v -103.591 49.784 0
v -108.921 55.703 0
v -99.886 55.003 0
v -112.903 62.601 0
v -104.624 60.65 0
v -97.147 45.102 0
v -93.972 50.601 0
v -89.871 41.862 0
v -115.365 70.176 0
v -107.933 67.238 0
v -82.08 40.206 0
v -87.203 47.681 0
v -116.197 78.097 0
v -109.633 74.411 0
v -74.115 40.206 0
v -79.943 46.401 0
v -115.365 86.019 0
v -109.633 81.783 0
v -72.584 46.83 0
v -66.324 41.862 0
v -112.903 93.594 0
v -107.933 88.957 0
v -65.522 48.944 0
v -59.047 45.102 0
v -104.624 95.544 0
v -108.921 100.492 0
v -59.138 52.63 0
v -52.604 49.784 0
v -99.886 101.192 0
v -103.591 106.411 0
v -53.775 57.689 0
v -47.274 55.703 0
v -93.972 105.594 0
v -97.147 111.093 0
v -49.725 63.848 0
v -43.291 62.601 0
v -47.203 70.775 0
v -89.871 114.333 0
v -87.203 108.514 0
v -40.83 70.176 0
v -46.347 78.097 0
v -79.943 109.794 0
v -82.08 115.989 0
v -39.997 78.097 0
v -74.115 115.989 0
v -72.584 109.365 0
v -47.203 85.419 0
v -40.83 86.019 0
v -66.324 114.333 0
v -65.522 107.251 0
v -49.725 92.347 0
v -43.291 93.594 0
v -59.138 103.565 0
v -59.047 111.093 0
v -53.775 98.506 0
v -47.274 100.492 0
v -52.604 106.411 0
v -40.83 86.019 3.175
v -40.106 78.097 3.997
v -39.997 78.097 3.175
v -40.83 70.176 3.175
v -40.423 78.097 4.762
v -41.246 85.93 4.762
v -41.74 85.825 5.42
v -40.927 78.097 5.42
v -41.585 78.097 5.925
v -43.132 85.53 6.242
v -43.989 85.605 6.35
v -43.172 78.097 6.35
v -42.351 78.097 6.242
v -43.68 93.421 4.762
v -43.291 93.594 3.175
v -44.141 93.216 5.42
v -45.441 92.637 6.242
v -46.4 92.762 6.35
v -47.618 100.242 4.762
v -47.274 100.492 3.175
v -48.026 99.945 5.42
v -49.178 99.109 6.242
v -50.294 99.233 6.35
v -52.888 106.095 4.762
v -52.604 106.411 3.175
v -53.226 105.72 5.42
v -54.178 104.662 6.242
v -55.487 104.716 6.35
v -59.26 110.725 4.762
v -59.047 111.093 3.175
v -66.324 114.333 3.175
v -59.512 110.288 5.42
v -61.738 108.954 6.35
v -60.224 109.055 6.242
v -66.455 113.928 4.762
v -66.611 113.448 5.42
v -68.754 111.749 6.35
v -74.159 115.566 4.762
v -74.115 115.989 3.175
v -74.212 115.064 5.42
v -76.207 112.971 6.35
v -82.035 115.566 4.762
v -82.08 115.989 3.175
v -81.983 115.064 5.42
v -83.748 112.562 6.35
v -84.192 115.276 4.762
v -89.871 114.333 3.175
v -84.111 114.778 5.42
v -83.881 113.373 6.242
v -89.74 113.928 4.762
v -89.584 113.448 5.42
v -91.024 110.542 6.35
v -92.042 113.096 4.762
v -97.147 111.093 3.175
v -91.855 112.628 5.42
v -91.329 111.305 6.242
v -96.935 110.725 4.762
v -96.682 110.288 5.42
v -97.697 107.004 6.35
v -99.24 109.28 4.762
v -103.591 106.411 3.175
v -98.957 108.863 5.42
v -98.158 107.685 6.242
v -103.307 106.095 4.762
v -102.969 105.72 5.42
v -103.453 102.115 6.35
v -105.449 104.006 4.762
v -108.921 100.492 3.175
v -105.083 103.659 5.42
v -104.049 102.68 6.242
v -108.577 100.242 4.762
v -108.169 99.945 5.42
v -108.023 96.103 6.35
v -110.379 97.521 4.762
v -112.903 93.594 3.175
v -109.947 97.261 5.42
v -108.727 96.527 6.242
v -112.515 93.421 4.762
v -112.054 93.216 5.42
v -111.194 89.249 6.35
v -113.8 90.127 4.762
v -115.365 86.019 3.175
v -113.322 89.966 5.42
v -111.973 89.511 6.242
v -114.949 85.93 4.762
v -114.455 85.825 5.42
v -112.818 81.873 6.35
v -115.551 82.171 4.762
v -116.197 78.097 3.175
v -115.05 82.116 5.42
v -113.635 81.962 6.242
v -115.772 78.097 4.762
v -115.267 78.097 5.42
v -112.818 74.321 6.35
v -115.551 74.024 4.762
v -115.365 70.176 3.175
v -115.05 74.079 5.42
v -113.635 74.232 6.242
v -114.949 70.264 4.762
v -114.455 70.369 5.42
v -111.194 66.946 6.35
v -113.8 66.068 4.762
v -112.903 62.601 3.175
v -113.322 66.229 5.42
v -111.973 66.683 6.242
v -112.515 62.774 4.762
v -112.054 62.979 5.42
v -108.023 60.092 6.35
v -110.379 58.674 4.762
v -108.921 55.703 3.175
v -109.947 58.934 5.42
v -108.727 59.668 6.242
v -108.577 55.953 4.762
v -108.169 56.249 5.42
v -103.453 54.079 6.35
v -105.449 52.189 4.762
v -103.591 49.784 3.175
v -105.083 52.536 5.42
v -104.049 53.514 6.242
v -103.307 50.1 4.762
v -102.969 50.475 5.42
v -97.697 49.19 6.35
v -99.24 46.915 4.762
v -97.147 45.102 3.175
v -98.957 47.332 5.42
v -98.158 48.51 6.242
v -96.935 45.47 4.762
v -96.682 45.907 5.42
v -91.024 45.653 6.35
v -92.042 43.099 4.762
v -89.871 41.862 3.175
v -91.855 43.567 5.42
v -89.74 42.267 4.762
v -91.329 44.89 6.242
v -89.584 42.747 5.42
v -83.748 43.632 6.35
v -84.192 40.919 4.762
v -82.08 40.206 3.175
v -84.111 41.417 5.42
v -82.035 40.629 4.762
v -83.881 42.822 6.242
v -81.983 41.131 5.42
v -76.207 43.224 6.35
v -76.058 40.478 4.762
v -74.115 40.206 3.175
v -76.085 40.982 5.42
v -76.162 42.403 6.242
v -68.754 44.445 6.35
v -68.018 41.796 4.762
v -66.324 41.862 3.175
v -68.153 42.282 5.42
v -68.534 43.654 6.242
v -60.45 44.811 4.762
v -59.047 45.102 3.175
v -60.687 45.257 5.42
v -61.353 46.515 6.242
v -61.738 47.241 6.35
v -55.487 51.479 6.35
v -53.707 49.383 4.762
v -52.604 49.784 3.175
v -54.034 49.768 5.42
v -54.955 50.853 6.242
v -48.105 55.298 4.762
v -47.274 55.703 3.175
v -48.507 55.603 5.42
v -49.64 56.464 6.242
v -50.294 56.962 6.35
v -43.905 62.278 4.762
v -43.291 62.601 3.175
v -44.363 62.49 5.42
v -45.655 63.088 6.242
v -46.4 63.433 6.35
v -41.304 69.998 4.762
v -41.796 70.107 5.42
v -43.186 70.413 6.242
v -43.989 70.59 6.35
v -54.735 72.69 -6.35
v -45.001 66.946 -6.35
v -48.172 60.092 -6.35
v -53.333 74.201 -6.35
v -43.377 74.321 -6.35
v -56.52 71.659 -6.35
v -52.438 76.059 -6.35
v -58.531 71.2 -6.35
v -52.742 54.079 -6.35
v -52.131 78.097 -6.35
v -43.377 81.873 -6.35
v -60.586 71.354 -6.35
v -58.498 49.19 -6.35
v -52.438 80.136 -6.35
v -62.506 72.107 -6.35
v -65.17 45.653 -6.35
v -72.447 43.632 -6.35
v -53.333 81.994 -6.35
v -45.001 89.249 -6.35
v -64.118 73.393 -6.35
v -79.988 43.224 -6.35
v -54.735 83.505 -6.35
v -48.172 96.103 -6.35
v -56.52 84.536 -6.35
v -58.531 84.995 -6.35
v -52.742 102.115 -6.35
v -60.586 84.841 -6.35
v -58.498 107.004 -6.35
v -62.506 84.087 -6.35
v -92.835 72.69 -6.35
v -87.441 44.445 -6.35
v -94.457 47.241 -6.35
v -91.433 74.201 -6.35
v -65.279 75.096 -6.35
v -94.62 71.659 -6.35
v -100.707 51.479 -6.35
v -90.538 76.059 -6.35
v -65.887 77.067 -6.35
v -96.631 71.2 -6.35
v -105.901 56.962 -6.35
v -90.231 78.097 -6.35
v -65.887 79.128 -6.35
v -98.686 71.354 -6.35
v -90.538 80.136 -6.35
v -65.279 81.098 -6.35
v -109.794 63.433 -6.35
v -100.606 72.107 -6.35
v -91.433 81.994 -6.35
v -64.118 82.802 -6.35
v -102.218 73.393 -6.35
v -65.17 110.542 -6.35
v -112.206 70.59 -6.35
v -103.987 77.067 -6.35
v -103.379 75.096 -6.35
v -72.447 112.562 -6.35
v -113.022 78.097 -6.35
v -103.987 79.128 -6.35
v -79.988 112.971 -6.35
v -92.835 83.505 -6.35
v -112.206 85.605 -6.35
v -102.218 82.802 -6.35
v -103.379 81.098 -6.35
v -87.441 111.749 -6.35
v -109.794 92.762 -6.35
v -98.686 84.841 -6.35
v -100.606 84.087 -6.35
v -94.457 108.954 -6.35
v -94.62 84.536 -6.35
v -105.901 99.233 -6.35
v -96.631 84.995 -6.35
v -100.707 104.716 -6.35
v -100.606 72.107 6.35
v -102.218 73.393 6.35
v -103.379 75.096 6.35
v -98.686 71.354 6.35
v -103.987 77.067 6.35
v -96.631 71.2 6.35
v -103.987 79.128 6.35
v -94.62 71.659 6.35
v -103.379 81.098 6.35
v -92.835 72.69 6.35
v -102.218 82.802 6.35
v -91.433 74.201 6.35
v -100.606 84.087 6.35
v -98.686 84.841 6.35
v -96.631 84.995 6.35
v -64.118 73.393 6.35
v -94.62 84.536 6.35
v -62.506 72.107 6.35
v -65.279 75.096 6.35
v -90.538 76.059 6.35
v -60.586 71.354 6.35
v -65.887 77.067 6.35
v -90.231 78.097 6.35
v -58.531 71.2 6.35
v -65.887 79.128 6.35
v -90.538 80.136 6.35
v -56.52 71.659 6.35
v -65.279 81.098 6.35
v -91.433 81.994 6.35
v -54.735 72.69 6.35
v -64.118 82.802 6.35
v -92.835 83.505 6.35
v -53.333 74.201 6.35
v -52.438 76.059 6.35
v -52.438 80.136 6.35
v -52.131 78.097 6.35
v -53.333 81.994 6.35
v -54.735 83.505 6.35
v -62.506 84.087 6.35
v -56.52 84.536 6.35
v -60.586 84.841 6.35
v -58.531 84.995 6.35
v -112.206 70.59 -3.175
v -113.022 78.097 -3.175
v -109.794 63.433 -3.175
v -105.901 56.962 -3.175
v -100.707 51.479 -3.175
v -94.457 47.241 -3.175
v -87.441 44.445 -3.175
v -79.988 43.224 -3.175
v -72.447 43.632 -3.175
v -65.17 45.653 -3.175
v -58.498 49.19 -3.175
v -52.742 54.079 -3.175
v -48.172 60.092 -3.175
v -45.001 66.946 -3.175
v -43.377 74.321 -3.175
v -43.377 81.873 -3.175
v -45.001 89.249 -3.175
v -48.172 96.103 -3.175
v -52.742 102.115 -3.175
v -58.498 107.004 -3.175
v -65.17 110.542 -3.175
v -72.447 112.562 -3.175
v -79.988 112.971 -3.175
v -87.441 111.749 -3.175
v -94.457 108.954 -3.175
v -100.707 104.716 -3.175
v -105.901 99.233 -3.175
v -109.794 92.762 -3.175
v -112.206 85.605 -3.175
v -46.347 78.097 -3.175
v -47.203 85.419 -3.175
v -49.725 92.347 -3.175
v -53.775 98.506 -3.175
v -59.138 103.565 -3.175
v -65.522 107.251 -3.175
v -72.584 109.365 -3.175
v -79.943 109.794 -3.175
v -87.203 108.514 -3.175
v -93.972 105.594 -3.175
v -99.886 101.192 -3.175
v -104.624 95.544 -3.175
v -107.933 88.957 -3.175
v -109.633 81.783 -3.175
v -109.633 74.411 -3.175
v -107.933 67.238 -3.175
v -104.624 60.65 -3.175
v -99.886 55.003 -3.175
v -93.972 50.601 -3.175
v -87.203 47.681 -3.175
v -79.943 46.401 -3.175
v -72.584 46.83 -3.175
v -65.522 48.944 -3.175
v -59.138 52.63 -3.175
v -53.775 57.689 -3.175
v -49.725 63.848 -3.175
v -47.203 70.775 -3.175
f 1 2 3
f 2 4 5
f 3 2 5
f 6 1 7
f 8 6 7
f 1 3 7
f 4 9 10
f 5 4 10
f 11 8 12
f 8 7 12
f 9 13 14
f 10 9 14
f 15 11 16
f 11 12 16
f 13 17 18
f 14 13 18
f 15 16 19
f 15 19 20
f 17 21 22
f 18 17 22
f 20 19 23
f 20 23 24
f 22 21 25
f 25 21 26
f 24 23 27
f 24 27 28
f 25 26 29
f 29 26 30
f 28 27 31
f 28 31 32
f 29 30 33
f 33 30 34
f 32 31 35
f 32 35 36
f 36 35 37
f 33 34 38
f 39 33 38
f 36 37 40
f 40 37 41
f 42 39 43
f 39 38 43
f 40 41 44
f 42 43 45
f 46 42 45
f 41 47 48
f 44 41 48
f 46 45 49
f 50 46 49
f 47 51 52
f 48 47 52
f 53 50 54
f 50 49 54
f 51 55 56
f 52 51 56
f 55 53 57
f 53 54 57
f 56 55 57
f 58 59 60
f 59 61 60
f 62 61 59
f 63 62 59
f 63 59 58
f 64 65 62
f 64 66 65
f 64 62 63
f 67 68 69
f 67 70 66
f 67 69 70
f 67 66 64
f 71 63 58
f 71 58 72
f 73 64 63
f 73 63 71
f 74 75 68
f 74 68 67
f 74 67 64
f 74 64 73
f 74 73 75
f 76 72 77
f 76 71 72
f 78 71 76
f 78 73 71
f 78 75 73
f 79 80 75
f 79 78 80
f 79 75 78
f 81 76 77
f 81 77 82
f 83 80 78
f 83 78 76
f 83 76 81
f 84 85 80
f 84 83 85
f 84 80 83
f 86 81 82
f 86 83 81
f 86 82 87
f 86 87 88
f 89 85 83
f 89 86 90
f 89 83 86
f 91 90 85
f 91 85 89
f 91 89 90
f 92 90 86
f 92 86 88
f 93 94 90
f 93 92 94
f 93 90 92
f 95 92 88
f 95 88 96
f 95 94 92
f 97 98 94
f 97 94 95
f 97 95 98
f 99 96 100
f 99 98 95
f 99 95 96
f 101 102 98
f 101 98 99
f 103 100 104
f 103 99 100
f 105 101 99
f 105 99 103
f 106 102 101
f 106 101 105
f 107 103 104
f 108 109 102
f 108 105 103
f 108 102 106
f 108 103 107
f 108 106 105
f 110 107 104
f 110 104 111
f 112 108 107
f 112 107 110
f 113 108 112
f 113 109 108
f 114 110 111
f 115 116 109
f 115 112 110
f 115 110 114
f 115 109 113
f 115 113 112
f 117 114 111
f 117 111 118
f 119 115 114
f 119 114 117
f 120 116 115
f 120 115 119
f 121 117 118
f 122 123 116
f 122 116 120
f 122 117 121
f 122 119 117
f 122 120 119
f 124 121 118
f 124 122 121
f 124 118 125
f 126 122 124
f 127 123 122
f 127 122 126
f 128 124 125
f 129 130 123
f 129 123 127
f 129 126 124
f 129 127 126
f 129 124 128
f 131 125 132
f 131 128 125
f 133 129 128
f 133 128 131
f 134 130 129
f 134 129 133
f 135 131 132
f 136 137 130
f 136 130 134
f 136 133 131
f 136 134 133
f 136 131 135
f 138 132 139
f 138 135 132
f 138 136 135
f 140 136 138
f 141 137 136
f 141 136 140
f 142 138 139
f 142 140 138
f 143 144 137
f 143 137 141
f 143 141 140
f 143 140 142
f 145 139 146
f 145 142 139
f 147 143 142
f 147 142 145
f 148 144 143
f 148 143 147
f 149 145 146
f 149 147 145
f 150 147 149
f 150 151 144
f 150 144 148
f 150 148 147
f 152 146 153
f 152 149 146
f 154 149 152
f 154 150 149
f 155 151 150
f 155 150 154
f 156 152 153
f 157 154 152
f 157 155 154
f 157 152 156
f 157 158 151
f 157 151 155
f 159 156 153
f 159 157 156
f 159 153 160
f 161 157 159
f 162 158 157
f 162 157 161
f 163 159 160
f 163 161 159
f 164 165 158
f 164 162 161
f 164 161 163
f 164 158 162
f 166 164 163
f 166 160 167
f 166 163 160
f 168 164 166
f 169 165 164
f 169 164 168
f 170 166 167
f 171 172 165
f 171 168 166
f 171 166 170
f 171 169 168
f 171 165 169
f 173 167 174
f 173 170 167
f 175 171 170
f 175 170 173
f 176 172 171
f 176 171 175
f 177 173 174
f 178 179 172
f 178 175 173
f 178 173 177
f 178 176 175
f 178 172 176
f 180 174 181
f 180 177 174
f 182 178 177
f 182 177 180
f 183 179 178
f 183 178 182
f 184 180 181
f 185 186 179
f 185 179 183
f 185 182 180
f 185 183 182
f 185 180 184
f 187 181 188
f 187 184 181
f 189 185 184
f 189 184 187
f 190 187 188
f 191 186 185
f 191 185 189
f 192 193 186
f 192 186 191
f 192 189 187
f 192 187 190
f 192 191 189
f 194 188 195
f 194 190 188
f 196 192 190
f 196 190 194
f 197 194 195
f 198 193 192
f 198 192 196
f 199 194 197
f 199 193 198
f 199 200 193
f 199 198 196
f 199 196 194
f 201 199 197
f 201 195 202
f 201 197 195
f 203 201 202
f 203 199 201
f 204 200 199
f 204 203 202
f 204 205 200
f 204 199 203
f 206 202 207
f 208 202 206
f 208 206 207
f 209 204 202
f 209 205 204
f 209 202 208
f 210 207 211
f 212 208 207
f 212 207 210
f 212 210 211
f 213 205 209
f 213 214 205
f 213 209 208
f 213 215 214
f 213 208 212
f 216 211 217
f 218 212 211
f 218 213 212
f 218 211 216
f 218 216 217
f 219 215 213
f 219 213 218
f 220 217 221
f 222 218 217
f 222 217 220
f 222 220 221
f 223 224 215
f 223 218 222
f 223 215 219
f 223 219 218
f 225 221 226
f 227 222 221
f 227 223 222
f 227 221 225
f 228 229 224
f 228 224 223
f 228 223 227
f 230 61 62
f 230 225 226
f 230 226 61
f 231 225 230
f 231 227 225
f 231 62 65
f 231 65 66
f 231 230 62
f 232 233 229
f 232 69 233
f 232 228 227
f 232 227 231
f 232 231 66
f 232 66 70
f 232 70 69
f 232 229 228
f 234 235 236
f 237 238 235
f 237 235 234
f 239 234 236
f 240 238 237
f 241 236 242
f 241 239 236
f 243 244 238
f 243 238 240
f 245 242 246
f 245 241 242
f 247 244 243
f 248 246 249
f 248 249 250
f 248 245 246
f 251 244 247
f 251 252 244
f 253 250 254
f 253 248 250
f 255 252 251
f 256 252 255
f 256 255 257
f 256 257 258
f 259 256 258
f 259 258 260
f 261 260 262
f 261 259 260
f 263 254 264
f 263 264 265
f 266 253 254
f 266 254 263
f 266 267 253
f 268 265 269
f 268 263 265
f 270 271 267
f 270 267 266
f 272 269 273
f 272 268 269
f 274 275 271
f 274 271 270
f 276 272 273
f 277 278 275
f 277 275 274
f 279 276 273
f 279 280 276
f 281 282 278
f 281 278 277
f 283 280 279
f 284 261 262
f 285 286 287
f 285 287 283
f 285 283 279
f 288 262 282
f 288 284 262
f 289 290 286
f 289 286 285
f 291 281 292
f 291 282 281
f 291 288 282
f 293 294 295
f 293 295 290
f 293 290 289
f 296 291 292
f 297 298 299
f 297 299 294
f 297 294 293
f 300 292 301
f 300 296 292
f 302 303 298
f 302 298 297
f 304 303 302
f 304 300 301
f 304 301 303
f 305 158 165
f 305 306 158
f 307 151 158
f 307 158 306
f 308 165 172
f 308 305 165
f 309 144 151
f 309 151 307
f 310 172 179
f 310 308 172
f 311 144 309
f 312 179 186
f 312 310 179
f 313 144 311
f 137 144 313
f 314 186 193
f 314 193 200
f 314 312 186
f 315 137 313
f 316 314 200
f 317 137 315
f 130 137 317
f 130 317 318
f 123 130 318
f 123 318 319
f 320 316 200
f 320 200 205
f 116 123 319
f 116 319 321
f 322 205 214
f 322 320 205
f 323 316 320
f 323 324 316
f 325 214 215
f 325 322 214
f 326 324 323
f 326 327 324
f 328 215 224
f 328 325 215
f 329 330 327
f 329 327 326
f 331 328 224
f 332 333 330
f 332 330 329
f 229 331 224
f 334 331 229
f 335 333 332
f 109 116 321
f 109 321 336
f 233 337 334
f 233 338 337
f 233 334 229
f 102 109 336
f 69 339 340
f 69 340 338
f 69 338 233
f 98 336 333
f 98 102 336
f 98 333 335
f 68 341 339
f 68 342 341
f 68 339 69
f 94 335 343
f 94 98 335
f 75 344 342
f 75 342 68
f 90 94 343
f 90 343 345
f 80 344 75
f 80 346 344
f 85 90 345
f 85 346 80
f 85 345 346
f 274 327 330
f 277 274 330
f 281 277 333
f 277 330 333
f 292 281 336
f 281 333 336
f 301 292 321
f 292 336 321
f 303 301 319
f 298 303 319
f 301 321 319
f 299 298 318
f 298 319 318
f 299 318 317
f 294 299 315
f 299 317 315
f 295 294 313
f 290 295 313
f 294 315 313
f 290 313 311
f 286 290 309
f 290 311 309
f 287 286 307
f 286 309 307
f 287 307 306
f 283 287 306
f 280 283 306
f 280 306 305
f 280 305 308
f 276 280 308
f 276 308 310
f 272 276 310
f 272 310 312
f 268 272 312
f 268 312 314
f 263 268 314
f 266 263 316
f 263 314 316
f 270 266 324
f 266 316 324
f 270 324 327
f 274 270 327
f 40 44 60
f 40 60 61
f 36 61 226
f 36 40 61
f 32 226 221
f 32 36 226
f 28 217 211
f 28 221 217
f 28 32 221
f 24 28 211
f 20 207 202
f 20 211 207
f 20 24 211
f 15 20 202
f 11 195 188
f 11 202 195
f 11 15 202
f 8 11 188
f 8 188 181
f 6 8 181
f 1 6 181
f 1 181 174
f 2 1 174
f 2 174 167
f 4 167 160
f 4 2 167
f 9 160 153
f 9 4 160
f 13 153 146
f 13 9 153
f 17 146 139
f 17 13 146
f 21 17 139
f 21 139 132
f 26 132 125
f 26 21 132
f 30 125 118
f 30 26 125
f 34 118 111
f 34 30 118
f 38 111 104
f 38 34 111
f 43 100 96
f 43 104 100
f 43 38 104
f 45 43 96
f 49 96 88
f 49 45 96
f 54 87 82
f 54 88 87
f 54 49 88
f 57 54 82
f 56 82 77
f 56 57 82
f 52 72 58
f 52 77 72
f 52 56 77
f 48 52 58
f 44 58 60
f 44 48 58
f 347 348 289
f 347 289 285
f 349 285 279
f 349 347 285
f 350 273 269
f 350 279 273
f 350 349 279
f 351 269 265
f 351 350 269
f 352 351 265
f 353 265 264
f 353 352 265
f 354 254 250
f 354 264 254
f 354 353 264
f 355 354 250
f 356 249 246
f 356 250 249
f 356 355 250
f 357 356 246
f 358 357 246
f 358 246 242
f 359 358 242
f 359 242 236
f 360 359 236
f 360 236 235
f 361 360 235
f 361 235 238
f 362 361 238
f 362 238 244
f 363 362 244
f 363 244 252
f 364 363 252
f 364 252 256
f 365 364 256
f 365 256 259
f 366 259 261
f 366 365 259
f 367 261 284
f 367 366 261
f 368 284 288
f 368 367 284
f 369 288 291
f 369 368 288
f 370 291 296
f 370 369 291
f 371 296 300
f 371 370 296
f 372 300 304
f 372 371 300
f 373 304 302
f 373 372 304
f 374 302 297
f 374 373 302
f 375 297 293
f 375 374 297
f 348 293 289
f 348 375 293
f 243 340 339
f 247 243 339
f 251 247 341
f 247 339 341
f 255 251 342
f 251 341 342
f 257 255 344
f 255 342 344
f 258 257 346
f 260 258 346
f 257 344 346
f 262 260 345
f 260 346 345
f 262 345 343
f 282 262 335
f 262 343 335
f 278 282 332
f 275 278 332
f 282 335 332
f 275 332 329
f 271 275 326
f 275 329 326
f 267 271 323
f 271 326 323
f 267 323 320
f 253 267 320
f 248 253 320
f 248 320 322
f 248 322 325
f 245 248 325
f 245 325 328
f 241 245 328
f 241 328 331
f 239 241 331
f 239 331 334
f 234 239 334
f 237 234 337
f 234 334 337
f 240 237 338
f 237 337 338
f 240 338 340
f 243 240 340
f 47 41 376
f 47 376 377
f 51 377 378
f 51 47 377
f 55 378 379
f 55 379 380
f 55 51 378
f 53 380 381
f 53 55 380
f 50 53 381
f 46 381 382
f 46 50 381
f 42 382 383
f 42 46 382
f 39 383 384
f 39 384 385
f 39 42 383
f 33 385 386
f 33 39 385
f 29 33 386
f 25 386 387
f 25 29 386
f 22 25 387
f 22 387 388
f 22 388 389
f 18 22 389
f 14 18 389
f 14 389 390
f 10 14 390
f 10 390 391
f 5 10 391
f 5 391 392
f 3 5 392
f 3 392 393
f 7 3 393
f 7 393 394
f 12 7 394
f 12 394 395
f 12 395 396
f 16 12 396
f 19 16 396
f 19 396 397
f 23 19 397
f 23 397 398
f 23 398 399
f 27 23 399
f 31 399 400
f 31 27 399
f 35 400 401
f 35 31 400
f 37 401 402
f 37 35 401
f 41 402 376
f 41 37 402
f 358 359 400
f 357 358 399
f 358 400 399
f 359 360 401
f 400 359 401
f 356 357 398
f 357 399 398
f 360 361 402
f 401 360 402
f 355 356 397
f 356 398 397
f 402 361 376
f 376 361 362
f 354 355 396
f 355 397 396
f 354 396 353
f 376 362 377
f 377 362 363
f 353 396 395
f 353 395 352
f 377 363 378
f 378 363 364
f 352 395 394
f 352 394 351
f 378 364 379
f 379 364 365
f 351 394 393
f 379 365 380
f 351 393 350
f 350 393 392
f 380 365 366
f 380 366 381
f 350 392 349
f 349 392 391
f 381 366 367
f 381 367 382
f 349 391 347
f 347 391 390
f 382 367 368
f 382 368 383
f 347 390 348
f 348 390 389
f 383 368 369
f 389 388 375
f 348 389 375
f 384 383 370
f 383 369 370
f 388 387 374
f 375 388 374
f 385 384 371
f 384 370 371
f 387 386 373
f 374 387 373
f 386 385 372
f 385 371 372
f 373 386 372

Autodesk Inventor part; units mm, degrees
ref_plane "YZ Plane" through (0, 0, 0) normal (1, 0, 0) x (0, 1, 0)
ref_plane "XZ Plane" through (0, 0, 0) normal (0, 1, 0) x (-1, 0, 0)
ref_plane "XY Plane" through (0, 0, 0) normal (0, 0, 1) x (1, 0, 0)
sketch "Sketch1" plane through (0, 0, 0) normal (0, 0, 1) x (1, 0, 0)
  circle A0 centre (-78.0974, 78.0974) radius 31.75 projected
  circle A1 centre (-78.0974, 78.0974) radius 38.1
  dimension "d0" = 76.2
extrude "Extrusion1" add sketch "Sketch1" along normal blind 6.35 contours A0 | A1
extrude "Extrusion2" add sketch "Sketch1" against normal blind 3.175 contours A0
sketch "Sketch3" plane through (-78.0974, 78.0974, -3.175) normal (0, 0, -1) x (-1, 0, 0)
  circle A0 centre (0, 0) radius 31.75 projected
  circle A1 centre (0, 0) radius 34.925
  dimension "d5" = 69.85
extrude "Extrusion3" add sketch "Sketch3" along normal blind 3.175 contours A0 | A1
fillet "Fillet1" radius 3.175 1 edges at (-116.1974, 78.0974, 6.35)
sketch "Sketch4" plane through (-78.0974, 78.0974, 6.35) normal (0, 0, 1) x (1, 0, 0)
  circle A0 centre (0, 0) radius 34.925 projected
  circle A1 centre (-19.05, 0) radius 6.9166
  circle A2 centre (19.05, 0) radius 6.9166
  dimension "d12" = 19.05
  dimension "d13" = 38.1
extrude "Extrusion4" cut sketch "Sketch4" against normal through all contours A1 | A2
equation "\"d13\" = 2 * d12"
properties part number "INSULATION-GASKET-2" material "Phenolic"
